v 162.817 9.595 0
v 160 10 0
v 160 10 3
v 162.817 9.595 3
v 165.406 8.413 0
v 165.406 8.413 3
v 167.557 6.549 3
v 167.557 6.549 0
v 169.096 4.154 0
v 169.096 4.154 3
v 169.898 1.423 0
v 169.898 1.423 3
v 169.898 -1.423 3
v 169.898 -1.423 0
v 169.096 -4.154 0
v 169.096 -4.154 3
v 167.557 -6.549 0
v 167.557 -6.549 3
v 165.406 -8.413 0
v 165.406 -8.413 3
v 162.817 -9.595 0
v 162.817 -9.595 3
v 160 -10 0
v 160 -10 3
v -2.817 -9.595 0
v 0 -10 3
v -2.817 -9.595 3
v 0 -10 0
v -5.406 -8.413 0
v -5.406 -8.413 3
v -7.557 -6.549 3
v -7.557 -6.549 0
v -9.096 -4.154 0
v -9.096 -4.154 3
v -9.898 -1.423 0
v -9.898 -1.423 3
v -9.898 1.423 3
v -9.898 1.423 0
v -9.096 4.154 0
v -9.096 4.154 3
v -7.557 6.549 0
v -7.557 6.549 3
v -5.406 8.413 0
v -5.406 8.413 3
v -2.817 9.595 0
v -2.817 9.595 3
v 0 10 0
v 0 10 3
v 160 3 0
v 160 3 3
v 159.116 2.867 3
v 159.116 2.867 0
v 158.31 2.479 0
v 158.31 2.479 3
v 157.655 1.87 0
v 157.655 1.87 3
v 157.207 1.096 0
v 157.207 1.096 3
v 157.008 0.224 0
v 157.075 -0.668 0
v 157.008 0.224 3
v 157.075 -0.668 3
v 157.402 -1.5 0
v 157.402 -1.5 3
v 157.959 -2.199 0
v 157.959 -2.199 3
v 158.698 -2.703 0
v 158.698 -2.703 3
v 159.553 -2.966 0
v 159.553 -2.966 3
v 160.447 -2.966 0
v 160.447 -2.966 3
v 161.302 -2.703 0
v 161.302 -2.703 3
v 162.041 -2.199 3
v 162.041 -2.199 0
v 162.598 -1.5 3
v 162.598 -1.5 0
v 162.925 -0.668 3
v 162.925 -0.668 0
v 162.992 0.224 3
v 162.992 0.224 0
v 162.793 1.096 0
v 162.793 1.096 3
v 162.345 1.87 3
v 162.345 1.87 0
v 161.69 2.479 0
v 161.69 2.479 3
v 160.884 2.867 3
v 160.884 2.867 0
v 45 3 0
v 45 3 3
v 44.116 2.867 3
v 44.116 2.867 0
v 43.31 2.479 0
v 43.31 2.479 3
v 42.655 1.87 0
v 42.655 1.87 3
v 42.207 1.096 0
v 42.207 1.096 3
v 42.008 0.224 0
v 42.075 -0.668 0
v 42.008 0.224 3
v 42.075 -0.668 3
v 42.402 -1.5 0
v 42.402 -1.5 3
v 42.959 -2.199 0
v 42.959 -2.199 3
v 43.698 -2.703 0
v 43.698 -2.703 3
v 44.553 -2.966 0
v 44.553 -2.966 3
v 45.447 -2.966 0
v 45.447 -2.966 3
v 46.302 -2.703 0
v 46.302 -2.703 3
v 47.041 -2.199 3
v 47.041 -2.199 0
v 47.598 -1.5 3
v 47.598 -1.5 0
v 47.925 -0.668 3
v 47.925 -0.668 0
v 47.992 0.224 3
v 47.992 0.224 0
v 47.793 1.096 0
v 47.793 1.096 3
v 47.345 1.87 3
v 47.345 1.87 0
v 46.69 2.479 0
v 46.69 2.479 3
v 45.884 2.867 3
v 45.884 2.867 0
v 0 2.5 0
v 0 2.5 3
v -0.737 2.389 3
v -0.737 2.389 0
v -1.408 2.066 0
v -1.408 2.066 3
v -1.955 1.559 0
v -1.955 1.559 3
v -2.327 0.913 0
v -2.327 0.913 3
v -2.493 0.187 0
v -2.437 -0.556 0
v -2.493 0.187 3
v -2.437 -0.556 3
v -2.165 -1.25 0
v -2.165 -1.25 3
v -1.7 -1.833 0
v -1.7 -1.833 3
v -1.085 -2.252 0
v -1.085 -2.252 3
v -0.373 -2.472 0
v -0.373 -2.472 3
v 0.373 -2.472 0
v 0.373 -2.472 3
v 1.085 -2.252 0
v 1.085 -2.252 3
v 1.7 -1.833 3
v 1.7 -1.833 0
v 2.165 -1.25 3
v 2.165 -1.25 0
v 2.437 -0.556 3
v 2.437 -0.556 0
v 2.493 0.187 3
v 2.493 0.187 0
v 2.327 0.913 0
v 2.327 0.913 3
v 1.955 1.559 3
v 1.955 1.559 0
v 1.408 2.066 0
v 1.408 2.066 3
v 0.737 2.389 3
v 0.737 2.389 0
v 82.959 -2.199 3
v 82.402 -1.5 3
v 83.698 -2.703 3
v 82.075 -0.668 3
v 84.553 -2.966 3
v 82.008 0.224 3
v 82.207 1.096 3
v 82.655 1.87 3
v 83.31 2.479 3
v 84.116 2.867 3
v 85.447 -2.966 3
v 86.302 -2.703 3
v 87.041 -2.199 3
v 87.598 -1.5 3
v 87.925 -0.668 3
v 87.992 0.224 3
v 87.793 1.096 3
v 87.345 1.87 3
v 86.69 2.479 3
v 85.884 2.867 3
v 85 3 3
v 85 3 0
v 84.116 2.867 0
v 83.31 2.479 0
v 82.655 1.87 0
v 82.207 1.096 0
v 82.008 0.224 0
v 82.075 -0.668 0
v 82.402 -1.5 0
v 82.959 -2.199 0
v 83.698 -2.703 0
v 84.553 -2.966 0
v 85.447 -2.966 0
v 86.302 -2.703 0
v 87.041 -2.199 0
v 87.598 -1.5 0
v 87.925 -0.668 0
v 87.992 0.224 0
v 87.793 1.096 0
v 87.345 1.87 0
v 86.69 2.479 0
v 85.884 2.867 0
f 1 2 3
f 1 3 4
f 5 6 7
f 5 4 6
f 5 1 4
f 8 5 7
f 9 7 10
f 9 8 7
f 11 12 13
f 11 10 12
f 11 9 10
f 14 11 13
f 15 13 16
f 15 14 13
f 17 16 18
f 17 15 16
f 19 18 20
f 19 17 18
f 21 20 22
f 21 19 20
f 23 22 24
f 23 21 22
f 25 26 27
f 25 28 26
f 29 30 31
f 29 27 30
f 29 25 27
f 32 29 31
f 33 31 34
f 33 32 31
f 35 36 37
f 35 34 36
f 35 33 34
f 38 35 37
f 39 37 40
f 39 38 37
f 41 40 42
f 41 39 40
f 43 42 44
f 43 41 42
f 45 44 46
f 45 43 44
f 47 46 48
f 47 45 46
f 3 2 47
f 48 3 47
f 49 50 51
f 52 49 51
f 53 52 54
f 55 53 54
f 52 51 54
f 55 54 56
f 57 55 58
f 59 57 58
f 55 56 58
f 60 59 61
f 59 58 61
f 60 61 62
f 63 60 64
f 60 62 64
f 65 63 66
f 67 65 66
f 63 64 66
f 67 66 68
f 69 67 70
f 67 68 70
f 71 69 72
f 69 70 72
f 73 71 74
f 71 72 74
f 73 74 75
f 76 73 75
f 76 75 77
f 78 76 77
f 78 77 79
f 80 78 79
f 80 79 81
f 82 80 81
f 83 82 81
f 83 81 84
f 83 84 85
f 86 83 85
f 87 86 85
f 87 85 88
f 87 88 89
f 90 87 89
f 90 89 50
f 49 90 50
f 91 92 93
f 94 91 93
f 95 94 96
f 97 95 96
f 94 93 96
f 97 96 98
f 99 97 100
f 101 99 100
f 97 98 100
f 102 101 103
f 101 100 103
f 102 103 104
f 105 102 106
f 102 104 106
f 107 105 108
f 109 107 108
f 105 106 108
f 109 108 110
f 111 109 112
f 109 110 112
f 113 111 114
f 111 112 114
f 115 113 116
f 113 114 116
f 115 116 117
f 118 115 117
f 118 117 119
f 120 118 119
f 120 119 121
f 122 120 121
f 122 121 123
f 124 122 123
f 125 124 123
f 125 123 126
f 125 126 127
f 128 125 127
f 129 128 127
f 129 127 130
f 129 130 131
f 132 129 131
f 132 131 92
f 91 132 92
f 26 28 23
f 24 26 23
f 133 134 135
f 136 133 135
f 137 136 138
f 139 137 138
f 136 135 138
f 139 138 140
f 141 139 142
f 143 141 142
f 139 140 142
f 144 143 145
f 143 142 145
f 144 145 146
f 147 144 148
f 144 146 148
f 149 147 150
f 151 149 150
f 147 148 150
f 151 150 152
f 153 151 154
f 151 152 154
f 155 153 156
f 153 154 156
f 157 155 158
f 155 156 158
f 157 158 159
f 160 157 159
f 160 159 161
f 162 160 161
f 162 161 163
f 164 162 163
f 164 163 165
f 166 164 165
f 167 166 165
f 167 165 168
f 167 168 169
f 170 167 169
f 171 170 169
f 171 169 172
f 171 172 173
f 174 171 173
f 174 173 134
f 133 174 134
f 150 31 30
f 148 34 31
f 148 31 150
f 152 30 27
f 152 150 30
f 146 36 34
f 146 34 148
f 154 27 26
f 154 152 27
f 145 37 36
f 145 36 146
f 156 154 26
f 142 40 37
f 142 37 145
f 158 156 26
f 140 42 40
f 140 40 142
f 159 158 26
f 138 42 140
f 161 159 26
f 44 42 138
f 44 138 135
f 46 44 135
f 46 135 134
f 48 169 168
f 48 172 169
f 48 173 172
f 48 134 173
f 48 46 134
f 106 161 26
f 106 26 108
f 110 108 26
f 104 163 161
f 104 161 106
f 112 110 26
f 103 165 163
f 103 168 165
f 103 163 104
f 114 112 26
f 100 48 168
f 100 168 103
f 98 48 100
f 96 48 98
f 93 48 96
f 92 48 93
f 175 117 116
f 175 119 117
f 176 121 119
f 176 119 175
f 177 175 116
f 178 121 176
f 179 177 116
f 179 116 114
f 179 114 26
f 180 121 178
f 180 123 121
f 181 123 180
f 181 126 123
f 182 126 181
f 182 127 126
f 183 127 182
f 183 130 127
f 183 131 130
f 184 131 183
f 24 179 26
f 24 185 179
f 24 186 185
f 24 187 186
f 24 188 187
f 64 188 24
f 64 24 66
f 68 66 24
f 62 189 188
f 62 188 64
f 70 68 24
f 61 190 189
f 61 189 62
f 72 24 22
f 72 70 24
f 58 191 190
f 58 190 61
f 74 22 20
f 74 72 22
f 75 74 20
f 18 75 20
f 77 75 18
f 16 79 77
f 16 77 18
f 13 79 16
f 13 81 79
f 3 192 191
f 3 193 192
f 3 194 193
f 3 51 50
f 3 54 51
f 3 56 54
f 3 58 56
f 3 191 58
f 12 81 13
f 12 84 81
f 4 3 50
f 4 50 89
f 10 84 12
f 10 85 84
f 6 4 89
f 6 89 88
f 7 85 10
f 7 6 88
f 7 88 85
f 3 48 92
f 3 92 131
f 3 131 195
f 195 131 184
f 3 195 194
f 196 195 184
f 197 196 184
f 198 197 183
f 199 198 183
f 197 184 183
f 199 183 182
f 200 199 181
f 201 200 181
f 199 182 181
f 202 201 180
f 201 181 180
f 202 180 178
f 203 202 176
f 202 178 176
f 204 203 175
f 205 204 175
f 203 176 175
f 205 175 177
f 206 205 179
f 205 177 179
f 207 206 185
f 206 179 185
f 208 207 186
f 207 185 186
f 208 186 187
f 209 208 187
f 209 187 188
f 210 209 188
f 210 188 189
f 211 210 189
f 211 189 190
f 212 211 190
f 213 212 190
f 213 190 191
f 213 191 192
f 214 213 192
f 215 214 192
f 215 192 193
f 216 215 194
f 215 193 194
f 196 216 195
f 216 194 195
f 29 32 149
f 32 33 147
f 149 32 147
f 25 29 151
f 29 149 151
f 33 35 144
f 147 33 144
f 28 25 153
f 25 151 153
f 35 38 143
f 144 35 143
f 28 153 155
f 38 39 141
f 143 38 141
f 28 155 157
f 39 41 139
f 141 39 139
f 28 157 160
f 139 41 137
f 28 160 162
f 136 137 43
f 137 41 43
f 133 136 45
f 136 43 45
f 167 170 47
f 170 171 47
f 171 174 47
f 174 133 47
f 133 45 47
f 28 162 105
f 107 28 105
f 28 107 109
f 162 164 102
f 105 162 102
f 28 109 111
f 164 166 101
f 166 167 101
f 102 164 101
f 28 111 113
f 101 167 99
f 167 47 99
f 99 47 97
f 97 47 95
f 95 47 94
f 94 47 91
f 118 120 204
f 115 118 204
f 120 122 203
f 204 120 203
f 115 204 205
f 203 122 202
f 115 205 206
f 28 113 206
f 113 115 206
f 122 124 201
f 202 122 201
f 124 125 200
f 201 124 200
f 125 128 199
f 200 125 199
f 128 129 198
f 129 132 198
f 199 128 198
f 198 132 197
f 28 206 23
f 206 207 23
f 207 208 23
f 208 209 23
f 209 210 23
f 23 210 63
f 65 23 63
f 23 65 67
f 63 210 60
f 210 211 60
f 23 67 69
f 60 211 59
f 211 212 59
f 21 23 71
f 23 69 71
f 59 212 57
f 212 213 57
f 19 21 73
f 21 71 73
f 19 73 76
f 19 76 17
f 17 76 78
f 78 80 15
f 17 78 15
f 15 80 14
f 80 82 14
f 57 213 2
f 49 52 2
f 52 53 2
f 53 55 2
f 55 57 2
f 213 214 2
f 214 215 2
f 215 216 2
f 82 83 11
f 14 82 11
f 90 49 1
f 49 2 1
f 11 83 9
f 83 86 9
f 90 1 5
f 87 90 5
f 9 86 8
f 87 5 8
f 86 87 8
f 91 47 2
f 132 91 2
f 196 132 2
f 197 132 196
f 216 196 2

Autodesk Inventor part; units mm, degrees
ref_plane "YZ Plane" through (0, 0, 0) normal (1, 0, 0) x (0, 1, 0)
ref_plane "XZ Plane" through (0, 0, 0) normal (0, 1, 0) x (-1, 0, 0)
ref_plane "XY Plane" through (0, 0, 0) normal (0, 0, 1) x (1, 0, 0)
sketch "Szkic1" plane through (0, 0, 0) normal (0, 0, 1) x (1, 0, 0)
  line L0 (0, 0) -> (160, 0) construction
  line L1 (0, -10) -> (160, -10)
  line L2 (160, 10) -> (0, 10)
  arc A0 (0, 10) -> (0, -10) centre (0, 0) ccw
  arc A1 (160, -10) -> (160, 10) centre (160, 0) ccw
  point P0 (80, 0)
  point P1 (85, 0)
  point P2 (45, 0)
  dimension "d0" = 160
  dimension "d1" = 20
  dimension "d2" = 75
  dimension "d12" = 45
extrude "Wyciągnięcie proste1" add sketch "Szkic1" along normal blind 3
hole "Otwór1" at (160, 0, 0) at (85, 0, 0) at (45, 0, 0) direction (0, 0, 1) diameter 6 end through all
hole "Otwór2" at (0, 0, 0) direction (0, 0, 1) diameter 5 end through all
properties part number "glowny_wahacz"
